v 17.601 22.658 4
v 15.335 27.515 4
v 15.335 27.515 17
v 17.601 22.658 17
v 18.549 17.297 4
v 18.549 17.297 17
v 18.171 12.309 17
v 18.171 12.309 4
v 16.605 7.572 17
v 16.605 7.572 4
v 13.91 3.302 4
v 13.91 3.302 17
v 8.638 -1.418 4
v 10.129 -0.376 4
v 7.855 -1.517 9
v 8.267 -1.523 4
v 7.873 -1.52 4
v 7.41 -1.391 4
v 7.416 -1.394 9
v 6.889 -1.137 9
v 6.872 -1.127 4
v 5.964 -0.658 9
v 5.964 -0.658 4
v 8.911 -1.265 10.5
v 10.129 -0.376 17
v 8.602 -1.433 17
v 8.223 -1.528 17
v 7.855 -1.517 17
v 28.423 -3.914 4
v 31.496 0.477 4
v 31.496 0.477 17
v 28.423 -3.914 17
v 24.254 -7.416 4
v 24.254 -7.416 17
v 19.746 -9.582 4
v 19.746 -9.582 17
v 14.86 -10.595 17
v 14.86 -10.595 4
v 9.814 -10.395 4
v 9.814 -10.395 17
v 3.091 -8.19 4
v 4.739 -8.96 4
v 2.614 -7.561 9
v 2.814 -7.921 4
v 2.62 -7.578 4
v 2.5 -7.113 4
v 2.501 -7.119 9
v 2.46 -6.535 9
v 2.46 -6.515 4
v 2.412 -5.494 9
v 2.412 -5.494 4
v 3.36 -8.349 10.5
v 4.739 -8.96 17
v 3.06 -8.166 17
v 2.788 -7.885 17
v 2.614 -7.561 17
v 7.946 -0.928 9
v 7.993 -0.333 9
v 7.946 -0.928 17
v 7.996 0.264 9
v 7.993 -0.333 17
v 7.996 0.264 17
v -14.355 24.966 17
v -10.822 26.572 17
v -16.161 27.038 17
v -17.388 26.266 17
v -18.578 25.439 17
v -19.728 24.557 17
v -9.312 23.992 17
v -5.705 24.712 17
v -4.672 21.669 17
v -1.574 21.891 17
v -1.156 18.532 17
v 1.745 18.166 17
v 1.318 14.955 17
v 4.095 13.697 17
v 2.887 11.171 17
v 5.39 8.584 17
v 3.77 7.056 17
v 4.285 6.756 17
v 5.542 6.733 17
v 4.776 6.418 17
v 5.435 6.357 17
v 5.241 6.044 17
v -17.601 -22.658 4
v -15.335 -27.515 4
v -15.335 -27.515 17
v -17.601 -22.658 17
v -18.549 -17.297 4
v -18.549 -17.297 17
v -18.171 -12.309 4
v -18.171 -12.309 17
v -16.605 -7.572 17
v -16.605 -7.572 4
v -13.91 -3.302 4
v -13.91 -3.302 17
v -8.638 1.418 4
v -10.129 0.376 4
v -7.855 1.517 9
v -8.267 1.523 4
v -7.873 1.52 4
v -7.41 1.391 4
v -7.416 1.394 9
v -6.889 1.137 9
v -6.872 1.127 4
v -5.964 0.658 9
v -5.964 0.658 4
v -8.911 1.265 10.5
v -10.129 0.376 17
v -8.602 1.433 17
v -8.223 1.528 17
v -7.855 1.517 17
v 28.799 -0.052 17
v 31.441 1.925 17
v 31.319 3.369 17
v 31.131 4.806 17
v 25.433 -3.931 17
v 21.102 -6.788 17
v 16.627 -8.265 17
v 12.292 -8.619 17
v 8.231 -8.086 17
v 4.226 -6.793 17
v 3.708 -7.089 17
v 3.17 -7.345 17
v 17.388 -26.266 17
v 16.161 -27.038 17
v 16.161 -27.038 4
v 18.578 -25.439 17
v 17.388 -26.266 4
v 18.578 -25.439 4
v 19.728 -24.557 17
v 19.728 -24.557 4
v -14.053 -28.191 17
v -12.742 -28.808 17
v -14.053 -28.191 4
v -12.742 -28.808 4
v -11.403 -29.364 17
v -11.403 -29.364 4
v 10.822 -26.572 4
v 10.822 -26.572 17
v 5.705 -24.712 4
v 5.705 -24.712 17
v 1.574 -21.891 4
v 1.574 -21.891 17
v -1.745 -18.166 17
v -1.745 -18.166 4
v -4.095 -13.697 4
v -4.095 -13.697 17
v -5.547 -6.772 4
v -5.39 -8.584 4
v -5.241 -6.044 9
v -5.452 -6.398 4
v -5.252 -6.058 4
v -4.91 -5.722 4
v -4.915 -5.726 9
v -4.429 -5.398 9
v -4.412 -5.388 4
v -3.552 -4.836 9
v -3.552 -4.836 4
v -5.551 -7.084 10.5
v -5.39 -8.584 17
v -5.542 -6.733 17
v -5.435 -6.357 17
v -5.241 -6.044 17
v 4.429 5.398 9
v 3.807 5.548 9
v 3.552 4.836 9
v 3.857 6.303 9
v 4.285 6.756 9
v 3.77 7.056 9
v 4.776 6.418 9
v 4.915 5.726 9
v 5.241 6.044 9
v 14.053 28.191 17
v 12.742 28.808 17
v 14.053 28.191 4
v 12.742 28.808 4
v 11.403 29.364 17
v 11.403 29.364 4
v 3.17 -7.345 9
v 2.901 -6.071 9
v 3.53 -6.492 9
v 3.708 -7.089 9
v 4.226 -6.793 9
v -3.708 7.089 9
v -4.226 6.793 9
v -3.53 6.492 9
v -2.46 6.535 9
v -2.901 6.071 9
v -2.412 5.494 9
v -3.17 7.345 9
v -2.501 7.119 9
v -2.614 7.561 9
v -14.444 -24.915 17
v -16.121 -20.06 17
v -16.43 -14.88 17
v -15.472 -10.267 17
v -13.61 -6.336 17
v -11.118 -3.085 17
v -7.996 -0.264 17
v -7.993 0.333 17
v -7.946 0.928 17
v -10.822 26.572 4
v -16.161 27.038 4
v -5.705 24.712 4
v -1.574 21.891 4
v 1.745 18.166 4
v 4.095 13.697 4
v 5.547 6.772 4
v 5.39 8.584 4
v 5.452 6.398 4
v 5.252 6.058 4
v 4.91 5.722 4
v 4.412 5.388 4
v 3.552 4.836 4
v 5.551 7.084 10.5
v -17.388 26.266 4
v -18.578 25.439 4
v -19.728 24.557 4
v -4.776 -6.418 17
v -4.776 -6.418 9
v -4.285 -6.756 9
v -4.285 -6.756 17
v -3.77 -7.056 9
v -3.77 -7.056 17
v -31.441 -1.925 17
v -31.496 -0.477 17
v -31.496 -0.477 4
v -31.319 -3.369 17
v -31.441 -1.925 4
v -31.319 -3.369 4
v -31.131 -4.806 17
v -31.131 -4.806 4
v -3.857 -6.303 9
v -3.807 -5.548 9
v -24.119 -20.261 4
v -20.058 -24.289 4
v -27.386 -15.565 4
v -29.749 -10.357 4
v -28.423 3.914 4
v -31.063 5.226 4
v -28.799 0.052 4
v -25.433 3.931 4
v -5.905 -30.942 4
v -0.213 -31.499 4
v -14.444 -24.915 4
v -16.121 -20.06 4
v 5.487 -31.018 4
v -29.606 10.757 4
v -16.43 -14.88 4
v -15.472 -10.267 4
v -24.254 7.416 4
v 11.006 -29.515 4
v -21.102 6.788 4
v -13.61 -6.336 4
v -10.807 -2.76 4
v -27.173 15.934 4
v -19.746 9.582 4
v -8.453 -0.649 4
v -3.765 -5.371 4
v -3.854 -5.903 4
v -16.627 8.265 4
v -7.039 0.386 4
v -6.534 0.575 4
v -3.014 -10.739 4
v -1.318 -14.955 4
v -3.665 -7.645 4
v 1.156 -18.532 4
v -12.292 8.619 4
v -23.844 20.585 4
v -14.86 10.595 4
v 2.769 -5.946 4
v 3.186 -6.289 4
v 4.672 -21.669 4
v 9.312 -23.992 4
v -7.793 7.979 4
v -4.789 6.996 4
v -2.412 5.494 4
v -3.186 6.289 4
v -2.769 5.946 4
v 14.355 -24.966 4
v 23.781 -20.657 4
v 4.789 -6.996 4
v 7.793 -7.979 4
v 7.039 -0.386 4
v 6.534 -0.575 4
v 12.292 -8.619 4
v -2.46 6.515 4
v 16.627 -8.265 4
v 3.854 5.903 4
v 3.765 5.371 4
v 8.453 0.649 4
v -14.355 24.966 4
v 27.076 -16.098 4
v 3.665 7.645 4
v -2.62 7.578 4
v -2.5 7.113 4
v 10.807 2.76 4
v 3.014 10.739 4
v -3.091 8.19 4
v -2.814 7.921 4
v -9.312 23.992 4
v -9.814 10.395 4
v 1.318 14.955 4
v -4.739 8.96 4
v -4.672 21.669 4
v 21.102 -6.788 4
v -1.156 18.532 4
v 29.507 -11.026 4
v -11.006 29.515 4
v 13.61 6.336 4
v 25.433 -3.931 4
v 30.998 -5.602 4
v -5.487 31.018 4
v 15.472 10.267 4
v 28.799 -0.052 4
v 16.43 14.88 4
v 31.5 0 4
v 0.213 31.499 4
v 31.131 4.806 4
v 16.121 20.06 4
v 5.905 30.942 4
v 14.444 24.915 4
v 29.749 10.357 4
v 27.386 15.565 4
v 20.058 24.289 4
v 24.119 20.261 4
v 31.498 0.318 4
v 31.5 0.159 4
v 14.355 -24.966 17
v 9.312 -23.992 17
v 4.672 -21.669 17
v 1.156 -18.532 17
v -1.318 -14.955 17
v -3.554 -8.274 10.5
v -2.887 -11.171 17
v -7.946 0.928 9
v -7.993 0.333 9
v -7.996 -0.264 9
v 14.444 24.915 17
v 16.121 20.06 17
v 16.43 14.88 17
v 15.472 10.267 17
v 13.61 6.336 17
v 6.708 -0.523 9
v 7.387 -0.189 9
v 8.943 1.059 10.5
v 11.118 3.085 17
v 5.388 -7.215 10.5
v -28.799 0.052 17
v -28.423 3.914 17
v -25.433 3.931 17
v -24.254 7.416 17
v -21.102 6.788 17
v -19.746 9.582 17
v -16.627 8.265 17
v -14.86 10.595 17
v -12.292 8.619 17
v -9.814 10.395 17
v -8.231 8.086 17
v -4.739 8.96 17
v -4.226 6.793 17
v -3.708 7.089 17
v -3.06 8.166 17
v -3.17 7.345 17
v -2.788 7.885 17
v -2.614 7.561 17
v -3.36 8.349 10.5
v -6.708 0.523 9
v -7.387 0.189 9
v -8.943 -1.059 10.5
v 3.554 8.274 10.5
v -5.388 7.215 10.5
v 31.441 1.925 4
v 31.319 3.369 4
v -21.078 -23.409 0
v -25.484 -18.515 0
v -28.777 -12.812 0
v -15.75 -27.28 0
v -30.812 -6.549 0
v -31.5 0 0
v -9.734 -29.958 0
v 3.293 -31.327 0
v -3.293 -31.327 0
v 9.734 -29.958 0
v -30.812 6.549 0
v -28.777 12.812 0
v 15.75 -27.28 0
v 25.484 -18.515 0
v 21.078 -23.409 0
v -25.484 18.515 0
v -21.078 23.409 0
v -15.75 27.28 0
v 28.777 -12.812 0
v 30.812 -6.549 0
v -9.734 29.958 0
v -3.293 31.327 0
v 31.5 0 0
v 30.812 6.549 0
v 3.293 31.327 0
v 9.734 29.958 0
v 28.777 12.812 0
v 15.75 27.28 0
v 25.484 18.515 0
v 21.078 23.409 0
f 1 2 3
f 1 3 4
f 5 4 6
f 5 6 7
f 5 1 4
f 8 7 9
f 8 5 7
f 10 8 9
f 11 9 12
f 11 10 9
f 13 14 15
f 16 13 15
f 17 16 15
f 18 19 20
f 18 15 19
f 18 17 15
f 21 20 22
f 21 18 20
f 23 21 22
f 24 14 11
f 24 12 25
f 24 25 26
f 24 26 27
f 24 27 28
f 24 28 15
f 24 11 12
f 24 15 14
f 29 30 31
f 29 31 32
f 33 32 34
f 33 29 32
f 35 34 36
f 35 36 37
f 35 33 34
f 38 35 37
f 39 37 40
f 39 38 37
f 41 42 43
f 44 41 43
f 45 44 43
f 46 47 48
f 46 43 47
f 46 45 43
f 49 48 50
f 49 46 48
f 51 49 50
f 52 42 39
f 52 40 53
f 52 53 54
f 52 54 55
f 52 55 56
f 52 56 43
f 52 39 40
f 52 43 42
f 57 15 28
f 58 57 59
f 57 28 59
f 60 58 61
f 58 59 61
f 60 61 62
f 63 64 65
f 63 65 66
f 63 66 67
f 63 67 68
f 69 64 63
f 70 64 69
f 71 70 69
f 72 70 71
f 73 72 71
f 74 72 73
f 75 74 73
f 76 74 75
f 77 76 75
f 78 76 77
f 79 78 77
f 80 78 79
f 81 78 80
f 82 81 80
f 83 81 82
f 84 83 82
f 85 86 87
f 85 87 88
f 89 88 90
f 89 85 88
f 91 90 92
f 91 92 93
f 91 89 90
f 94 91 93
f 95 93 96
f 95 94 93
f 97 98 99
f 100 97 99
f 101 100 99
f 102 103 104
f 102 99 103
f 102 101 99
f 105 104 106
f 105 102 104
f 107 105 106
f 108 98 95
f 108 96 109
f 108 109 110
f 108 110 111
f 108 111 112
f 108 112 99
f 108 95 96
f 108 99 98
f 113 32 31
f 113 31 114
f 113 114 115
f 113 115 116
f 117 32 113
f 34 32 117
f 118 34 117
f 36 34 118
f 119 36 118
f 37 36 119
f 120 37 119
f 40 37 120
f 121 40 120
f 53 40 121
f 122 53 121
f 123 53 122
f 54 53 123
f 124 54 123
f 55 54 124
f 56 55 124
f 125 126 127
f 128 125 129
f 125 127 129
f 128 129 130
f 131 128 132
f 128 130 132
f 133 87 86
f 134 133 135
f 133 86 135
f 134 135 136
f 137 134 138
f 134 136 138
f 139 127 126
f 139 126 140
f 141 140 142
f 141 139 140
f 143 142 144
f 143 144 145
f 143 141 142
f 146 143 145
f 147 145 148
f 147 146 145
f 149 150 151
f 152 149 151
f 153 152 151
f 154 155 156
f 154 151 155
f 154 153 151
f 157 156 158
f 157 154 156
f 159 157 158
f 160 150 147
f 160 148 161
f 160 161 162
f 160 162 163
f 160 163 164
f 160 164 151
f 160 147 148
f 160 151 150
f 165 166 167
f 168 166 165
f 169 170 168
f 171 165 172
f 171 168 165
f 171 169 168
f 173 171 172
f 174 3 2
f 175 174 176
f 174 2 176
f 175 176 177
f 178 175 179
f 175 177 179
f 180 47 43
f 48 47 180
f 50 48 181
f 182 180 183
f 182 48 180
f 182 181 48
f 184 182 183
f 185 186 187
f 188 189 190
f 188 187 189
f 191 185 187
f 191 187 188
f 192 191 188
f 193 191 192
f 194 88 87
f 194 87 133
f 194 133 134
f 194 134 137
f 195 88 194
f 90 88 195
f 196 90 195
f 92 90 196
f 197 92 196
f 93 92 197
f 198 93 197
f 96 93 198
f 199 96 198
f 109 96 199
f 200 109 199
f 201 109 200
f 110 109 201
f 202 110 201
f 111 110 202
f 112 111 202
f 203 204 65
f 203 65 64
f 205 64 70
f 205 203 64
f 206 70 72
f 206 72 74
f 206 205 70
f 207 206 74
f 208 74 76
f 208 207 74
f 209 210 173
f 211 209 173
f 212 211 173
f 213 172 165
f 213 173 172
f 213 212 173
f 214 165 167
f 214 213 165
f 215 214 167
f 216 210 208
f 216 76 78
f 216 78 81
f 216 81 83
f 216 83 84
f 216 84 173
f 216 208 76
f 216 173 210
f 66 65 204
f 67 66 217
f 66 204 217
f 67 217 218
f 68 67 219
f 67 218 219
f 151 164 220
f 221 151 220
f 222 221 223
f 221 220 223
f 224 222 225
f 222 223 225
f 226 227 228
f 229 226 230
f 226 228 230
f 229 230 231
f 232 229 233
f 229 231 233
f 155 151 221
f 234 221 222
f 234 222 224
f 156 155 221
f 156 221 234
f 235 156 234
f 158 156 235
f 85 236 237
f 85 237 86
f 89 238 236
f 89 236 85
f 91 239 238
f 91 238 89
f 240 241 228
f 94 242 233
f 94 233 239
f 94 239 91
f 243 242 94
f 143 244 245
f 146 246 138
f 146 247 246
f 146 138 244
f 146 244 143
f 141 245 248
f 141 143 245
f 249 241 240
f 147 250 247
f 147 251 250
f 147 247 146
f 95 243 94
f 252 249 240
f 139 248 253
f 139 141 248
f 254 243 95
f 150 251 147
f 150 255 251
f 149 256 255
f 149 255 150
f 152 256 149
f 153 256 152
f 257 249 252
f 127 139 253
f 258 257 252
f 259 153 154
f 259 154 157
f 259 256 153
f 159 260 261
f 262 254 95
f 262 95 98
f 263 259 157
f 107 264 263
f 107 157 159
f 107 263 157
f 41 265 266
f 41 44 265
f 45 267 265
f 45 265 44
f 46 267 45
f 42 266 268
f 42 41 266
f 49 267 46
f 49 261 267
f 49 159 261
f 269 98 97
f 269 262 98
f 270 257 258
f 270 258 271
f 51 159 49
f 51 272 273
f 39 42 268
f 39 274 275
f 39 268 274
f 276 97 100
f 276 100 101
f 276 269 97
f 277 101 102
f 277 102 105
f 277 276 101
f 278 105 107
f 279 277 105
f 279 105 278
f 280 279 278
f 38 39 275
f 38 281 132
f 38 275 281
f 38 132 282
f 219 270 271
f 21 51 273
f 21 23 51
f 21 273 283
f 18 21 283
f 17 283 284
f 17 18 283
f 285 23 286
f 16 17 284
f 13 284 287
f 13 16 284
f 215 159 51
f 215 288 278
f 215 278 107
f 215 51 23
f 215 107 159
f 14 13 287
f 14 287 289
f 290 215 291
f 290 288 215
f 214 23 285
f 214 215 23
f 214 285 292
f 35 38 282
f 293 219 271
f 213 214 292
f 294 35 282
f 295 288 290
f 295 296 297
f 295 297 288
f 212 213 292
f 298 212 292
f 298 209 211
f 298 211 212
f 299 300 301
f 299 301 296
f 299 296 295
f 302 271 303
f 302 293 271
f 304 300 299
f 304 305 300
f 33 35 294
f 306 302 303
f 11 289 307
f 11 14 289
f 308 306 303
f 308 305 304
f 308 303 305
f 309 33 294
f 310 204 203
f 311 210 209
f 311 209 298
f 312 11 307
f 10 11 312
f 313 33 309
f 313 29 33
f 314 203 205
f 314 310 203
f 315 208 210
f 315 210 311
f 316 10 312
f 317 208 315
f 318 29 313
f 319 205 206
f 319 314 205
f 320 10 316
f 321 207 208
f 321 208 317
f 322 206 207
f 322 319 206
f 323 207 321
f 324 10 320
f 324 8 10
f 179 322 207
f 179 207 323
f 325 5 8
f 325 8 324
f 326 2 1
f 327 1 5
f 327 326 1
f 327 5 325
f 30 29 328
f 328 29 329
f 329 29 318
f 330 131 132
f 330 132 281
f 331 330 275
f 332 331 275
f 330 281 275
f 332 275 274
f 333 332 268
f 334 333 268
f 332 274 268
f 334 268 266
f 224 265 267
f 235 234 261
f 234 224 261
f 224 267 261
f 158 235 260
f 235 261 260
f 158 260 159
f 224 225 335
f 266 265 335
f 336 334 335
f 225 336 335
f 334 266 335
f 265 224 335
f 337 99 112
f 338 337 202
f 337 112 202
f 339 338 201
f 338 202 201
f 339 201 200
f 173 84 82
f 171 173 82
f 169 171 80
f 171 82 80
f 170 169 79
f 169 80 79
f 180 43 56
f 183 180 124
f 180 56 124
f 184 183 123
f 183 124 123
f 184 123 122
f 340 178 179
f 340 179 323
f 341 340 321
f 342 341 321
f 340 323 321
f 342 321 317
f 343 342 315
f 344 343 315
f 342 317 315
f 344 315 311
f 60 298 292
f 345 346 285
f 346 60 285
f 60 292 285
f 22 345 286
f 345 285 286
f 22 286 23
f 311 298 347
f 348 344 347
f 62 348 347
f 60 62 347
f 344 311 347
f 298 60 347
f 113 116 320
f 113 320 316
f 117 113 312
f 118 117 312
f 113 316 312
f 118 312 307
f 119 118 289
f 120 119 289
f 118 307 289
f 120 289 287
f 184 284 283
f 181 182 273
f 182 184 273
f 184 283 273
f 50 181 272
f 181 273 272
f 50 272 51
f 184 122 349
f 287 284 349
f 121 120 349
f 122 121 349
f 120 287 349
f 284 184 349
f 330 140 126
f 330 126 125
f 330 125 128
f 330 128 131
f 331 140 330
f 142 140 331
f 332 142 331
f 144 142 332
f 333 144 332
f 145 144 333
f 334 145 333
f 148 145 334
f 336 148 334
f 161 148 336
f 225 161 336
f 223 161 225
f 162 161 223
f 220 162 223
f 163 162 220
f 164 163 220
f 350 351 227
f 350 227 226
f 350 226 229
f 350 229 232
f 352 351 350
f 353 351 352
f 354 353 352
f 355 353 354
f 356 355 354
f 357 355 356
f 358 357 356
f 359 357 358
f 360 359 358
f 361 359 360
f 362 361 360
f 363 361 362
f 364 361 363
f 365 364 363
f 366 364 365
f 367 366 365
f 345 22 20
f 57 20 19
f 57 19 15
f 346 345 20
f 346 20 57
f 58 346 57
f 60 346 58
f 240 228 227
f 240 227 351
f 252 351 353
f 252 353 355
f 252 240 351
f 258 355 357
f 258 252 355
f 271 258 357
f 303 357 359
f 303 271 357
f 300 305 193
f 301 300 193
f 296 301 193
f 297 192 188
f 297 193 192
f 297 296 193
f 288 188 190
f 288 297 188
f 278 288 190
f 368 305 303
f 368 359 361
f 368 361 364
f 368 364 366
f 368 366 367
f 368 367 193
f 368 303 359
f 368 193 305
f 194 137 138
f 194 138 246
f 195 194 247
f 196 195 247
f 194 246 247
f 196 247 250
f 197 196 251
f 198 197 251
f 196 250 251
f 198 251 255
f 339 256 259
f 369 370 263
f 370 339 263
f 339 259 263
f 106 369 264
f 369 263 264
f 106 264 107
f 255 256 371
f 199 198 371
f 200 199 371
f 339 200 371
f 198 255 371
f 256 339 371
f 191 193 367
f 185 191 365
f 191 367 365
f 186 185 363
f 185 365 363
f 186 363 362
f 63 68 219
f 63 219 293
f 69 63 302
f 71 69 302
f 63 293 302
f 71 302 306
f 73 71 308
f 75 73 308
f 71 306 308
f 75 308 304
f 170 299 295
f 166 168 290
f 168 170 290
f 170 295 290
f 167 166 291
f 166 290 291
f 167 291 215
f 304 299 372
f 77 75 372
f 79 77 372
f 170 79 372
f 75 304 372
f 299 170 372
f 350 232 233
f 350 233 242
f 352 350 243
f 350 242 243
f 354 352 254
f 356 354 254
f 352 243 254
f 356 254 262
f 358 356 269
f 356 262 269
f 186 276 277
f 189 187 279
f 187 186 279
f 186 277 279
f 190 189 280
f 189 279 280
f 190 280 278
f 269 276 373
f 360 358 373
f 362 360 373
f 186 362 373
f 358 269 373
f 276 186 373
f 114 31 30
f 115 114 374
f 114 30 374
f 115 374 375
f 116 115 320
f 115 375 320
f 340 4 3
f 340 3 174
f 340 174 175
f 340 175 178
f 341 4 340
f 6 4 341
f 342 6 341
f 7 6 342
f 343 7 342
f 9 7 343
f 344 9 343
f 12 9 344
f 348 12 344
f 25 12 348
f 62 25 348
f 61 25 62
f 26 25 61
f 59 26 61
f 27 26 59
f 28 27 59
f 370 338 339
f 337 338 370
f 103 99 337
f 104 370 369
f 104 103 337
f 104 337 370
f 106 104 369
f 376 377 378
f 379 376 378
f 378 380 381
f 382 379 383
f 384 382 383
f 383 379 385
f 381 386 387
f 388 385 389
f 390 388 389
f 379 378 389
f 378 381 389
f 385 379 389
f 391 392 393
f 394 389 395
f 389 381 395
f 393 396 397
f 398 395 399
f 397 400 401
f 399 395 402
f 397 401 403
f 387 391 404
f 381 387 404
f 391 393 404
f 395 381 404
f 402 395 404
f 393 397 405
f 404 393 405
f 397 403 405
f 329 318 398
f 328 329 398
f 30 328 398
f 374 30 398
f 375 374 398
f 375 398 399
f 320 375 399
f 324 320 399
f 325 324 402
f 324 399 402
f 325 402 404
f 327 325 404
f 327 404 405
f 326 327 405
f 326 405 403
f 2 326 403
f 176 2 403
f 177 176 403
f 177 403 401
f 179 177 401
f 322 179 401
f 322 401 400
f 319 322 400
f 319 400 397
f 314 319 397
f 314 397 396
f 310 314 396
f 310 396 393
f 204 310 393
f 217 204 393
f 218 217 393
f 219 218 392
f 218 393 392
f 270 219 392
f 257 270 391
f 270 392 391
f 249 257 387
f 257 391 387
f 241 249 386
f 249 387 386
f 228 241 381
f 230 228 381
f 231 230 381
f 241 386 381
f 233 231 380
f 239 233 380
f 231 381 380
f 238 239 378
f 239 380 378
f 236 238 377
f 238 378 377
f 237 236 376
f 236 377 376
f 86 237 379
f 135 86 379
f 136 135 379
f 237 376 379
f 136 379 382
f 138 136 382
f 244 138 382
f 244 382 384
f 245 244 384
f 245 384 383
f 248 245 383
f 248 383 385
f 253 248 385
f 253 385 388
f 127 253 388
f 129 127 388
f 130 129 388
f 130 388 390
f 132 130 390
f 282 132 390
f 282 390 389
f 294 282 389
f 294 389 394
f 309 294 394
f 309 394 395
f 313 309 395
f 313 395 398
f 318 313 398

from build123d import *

# Parameters (mm, degrees)
SKETCH1_R          = 31.5
EXTRUDE1_DEPTH     = 4
EXTRUDE2_DEPTH     = 13
CIRPATTERN1_COUNT  = 6
SKETCH9_R          = 8
CUT_EXTRUDE1_DEPTH = 8


with BuildPart() as part:
    # Sketch1 → Extrude1 (new body)
    with BuildSketch(Plane.XY):
        Circle(SKETCH1_R)
    extrude(amount=EXTRUDE1_DEPTH)

    # Sketch8 → Extrude2 (add)
    with BuildSketch(Plane.XY.offset(4)):
        with BuildLine():
            ThreePointArc((-15.335083755, -27.515181378), (-13.401012303, -28.5072424), (-11.403128973, -29.363559894))
            add(Edge.make_bspline(
                [(-11.403128973, -29.363559894), (-18.960599099, -20.910233685), (-18.057148894, -8.477271422), (-7.839740111, -0.161000485), (-7.171379792, 0.610841586), (-5.963772485, 0.658344705)],
                knots=[0, 0, 0, 0, 0.892040708, 0.892040708, 1, 1, 1, 1], degree=3))
            add(Edge.make_bspline(
                [(-15.335083755, -27.515181378), (-20.746685268, -19.074778053), (-19.86094526, -6.243260483), (-7.793442469, 2.03080533), (-6.812175467, 0.957264639), (-5.963772485, 0.658344705)],
                knots=[0, 0, 0, 0, 0.907416994, 0.907416994, 1, 1, 1, 1], degree=3))
        make_face()
    extrude2 = extrude(amount=EXTRUDE2_DEPTH)

    # CirPattern1: Extrude2 ×6 about axis
    cirpattern1_axis = Axis((0, 0, 4), (0, 0, -1))
    for i in range(1, CIRPATTERN1_COUNT):
        add(extrude2.rotate(cirpattern1_axis, i * 360 / CIRPATTERN1_COUNT))

    # Sketch9 → Cut-Extrude1 (cut)
    with BuildSketch(Plane.XY.offset(17)):
        Circle(SKETCH9_R)
    extrude(amount=-CUT_EXTRUDE1_DEPTH, mode=Mode.SUBTRACT)


solid = part.part
